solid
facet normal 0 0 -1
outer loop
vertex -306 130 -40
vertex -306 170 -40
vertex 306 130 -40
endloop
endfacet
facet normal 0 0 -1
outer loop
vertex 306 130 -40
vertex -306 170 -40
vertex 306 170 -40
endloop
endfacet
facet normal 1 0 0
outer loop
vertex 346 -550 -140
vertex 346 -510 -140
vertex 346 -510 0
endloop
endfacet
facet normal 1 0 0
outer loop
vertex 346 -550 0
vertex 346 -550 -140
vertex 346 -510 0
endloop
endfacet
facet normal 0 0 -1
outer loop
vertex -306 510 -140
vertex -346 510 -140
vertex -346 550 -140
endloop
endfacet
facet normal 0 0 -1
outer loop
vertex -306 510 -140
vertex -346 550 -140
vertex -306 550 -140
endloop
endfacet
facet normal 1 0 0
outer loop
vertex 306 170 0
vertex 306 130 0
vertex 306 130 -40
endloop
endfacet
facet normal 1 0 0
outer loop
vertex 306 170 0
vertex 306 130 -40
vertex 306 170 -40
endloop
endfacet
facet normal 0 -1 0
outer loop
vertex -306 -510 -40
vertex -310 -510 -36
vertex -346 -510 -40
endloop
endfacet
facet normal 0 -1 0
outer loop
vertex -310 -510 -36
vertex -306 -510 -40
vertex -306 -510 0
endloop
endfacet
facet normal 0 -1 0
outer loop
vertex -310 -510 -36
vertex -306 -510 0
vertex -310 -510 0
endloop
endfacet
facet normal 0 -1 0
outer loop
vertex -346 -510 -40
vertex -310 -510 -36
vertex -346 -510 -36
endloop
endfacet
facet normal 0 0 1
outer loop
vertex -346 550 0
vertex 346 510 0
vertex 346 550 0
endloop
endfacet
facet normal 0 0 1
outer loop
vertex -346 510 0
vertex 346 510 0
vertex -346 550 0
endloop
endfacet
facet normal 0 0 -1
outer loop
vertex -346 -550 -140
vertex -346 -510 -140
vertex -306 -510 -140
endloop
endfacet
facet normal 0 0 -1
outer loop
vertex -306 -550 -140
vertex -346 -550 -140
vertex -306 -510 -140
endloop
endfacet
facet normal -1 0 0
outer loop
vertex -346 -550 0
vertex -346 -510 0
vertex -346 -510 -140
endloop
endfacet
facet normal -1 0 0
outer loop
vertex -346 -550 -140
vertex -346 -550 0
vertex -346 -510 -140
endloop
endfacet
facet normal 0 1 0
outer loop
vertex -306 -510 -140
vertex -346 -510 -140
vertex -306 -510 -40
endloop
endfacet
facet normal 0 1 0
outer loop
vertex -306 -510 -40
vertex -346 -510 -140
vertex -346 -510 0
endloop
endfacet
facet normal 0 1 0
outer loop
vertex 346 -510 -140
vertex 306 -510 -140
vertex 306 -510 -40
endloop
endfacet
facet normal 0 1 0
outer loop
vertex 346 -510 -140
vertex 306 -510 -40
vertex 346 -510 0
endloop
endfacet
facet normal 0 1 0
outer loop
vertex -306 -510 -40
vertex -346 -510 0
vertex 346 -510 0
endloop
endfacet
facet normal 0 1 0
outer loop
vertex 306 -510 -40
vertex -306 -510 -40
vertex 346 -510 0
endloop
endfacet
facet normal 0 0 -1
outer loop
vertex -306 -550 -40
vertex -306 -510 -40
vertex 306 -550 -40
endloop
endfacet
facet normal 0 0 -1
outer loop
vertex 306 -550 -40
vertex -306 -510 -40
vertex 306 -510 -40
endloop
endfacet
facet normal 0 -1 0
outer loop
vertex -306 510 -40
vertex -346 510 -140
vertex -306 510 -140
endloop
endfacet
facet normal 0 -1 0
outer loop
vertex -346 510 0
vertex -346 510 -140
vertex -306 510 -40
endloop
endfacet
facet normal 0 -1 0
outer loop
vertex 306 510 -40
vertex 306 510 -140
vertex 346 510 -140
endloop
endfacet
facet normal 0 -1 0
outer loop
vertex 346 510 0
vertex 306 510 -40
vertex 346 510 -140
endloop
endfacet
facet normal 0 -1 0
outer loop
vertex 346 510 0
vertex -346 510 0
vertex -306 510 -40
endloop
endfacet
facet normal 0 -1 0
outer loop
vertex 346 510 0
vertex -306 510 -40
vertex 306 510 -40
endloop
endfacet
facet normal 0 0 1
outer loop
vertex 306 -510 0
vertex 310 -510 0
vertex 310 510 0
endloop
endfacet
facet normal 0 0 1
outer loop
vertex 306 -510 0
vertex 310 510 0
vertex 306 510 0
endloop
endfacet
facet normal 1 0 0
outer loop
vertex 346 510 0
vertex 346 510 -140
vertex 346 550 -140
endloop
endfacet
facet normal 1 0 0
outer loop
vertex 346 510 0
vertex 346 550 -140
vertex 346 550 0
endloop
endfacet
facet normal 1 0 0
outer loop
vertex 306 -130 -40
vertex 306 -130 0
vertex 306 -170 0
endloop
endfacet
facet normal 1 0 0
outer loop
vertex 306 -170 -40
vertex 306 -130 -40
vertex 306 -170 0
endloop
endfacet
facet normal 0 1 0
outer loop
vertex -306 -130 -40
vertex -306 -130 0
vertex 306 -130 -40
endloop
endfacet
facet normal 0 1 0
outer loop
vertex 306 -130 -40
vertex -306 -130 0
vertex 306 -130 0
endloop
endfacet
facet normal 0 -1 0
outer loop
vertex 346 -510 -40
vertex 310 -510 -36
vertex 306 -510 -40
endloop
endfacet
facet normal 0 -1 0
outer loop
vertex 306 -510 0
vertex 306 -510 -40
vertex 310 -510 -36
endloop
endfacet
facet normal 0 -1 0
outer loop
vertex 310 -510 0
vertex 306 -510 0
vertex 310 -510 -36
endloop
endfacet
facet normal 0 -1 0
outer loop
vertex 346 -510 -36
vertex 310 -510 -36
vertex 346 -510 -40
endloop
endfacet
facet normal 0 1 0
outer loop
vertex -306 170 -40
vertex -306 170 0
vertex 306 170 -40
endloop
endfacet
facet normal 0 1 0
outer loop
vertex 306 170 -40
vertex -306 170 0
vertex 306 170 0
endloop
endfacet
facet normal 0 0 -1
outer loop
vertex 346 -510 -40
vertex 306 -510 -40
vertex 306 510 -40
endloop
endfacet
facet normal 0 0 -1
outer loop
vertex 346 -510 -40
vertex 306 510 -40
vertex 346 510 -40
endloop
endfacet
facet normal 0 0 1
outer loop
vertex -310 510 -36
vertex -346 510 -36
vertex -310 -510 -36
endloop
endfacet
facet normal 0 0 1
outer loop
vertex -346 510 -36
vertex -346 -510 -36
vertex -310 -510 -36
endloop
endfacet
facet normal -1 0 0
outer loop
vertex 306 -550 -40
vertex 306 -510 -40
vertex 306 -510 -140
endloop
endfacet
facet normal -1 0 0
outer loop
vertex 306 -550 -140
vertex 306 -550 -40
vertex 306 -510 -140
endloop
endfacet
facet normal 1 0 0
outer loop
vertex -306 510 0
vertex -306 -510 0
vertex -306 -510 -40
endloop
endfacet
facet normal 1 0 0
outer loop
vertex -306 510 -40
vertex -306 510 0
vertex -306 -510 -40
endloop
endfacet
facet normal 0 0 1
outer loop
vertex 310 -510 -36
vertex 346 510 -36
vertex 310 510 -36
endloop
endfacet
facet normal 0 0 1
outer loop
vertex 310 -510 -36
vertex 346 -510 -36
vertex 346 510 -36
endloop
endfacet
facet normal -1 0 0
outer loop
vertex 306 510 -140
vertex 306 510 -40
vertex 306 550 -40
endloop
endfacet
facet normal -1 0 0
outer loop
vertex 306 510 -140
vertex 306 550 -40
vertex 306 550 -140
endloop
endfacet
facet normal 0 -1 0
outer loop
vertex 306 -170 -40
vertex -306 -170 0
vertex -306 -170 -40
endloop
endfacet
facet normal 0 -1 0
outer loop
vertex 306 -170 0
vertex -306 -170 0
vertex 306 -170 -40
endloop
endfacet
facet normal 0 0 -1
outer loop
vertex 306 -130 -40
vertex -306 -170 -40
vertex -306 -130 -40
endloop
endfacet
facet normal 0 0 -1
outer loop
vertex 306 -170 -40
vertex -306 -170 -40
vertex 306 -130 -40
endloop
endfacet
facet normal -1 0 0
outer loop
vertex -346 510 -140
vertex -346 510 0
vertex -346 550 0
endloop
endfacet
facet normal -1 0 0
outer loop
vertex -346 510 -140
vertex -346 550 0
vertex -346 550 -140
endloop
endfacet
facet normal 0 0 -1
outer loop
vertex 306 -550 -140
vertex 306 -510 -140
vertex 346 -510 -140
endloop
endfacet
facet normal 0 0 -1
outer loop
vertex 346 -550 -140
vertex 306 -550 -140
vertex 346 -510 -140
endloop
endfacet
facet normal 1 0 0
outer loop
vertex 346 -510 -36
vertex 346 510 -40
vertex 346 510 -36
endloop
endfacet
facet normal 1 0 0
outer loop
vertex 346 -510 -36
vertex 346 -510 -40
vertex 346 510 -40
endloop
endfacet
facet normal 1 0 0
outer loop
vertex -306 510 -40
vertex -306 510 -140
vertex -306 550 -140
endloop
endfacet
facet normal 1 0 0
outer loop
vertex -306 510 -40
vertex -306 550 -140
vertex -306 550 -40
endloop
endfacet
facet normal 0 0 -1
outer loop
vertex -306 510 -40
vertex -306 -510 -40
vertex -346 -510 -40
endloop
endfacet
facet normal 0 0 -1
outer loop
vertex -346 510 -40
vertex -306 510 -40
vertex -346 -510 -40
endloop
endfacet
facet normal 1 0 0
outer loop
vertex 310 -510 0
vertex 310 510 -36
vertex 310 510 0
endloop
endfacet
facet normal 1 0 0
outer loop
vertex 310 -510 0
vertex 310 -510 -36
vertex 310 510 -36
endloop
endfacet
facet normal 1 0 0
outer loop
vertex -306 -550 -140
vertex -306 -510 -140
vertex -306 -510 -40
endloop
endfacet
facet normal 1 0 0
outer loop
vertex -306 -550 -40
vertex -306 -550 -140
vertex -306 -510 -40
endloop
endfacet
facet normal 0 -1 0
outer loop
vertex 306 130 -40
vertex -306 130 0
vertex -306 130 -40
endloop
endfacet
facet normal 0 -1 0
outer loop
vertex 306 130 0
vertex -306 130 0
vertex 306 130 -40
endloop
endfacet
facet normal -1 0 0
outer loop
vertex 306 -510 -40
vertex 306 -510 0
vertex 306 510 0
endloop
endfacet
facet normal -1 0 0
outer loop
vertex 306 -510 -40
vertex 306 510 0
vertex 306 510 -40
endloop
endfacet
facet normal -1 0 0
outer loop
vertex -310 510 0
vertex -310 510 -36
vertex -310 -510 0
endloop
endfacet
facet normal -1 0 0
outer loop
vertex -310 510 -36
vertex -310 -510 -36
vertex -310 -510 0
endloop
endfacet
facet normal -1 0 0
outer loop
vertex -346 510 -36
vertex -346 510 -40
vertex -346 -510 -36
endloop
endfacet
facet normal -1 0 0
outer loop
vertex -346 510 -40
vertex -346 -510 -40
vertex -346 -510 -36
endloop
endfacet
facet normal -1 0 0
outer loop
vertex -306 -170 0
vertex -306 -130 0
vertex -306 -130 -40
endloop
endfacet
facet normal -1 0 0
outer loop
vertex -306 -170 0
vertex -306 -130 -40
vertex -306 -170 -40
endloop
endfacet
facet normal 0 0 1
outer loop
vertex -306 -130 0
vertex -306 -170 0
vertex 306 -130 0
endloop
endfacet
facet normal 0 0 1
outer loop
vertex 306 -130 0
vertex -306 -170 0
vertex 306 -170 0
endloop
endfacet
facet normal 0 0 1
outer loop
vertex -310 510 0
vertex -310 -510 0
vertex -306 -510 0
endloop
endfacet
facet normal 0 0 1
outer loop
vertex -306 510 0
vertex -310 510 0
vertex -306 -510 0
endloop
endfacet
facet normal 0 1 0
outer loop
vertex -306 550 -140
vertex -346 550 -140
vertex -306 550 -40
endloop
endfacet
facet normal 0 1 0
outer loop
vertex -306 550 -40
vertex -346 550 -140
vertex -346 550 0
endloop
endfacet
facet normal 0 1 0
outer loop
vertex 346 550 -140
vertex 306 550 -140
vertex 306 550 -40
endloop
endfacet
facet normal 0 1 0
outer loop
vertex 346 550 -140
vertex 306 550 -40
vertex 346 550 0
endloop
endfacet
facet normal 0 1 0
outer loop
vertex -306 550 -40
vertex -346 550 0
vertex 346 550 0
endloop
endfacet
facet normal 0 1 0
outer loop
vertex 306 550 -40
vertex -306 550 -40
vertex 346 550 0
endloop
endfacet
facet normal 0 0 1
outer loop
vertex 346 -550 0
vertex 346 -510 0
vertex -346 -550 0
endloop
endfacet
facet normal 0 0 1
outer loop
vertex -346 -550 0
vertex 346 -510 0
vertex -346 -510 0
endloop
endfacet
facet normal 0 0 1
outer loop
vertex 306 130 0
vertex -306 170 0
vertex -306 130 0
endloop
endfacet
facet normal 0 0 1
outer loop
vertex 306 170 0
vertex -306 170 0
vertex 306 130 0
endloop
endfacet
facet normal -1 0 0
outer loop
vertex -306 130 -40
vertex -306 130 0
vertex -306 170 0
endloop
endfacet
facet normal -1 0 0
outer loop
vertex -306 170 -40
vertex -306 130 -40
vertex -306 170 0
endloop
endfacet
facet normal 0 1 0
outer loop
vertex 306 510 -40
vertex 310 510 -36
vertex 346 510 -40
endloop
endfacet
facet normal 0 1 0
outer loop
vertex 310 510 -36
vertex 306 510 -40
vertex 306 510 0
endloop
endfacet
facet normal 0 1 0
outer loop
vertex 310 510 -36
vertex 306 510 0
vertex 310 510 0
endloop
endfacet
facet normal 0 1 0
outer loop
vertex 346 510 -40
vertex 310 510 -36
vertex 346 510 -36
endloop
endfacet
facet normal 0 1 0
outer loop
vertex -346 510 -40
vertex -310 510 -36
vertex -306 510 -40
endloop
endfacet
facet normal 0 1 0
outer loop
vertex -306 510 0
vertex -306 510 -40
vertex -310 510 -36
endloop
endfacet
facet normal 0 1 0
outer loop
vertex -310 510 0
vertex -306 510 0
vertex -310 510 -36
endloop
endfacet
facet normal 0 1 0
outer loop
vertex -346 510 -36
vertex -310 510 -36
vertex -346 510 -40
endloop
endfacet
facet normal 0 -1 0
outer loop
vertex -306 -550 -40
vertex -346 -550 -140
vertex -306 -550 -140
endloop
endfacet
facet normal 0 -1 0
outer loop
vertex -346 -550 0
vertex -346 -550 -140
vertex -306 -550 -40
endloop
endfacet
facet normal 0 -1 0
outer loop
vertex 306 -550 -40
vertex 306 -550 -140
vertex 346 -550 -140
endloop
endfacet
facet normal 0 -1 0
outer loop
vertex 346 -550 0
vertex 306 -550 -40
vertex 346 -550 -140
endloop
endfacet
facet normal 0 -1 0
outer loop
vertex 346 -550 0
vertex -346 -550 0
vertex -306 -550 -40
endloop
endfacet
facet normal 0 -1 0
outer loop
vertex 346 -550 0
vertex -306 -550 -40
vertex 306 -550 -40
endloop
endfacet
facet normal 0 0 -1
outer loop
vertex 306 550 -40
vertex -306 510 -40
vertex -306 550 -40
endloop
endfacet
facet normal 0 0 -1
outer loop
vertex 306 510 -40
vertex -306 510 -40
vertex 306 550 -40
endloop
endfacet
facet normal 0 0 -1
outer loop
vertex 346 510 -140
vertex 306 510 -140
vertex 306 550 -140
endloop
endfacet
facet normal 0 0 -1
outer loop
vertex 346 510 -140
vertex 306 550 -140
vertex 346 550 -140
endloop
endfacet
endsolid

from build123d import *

# Parameters (mm, degrees)
F1_DEPTH = 510
F3_DEPTH = 40
F4_W     = 612
F4_H     = 40
F5_DEPTH = 40


# Not quite as in the source:
# - a pattern or mirror of a feature is missing from the dataset's text; its kind, count and spacing are read off the source's solid


with BuildPart() as f1:
    # F0 (on Front) → F1 (new body, symmetric)
    with BuildSketch(Plane.XZ):
        Polygon((310, -36), (310, 0), (306, 0), (306, -40), (346, -40), (346, -36), align=None)
    extrude(amount=F1_DEPTH, both=True)


with BuildPart() as f1_copies_1:
    # F1_copies: instance of F1
    add(f1.part.mirror(Plane(origin=(0, 0, 0), x_dir=(0, 0, -1), z_dir=(-1, 0, 0))))


with BuildPart() as f3:
    # F2 (on face) → F3 (new body)
    with BuildSketch(Plane.XZ.offset(510)):
        Polygon((-306, -40), (306, -40), (306, -140), (346, -140), (346, 0), (-346, 0), (-346, -140), (-306, -140), align=None)
    extrude(amount=F3_DEPTH)


with BuildPart() as f3_copies_1:
    # F3_copies: instance of F3
    add(f3.part.mirror(Plane.ZX))


with BuildPart() as f5:
    # F4 (on face) → F5 (new body)
    with BuildSketch(Plane.XY):
        with Locations((0, 150)):
            Rectangle(F4_W, F4_H)
    extrude(amount=-F5_DEPTH)


with BuildPart() as f5_copies_1:
    # F5_copies: instance of F5
    add(f5.part.mirror(Plane(origin=(0, 0, 0), x_dir=(0, 0, -1), z_dir=(0, -1, 0))))


solid = Compound([f1.part, f1_copies_1.part, f3.part, f3_copies_1.part, f5.part, f5_copies_1.part])
